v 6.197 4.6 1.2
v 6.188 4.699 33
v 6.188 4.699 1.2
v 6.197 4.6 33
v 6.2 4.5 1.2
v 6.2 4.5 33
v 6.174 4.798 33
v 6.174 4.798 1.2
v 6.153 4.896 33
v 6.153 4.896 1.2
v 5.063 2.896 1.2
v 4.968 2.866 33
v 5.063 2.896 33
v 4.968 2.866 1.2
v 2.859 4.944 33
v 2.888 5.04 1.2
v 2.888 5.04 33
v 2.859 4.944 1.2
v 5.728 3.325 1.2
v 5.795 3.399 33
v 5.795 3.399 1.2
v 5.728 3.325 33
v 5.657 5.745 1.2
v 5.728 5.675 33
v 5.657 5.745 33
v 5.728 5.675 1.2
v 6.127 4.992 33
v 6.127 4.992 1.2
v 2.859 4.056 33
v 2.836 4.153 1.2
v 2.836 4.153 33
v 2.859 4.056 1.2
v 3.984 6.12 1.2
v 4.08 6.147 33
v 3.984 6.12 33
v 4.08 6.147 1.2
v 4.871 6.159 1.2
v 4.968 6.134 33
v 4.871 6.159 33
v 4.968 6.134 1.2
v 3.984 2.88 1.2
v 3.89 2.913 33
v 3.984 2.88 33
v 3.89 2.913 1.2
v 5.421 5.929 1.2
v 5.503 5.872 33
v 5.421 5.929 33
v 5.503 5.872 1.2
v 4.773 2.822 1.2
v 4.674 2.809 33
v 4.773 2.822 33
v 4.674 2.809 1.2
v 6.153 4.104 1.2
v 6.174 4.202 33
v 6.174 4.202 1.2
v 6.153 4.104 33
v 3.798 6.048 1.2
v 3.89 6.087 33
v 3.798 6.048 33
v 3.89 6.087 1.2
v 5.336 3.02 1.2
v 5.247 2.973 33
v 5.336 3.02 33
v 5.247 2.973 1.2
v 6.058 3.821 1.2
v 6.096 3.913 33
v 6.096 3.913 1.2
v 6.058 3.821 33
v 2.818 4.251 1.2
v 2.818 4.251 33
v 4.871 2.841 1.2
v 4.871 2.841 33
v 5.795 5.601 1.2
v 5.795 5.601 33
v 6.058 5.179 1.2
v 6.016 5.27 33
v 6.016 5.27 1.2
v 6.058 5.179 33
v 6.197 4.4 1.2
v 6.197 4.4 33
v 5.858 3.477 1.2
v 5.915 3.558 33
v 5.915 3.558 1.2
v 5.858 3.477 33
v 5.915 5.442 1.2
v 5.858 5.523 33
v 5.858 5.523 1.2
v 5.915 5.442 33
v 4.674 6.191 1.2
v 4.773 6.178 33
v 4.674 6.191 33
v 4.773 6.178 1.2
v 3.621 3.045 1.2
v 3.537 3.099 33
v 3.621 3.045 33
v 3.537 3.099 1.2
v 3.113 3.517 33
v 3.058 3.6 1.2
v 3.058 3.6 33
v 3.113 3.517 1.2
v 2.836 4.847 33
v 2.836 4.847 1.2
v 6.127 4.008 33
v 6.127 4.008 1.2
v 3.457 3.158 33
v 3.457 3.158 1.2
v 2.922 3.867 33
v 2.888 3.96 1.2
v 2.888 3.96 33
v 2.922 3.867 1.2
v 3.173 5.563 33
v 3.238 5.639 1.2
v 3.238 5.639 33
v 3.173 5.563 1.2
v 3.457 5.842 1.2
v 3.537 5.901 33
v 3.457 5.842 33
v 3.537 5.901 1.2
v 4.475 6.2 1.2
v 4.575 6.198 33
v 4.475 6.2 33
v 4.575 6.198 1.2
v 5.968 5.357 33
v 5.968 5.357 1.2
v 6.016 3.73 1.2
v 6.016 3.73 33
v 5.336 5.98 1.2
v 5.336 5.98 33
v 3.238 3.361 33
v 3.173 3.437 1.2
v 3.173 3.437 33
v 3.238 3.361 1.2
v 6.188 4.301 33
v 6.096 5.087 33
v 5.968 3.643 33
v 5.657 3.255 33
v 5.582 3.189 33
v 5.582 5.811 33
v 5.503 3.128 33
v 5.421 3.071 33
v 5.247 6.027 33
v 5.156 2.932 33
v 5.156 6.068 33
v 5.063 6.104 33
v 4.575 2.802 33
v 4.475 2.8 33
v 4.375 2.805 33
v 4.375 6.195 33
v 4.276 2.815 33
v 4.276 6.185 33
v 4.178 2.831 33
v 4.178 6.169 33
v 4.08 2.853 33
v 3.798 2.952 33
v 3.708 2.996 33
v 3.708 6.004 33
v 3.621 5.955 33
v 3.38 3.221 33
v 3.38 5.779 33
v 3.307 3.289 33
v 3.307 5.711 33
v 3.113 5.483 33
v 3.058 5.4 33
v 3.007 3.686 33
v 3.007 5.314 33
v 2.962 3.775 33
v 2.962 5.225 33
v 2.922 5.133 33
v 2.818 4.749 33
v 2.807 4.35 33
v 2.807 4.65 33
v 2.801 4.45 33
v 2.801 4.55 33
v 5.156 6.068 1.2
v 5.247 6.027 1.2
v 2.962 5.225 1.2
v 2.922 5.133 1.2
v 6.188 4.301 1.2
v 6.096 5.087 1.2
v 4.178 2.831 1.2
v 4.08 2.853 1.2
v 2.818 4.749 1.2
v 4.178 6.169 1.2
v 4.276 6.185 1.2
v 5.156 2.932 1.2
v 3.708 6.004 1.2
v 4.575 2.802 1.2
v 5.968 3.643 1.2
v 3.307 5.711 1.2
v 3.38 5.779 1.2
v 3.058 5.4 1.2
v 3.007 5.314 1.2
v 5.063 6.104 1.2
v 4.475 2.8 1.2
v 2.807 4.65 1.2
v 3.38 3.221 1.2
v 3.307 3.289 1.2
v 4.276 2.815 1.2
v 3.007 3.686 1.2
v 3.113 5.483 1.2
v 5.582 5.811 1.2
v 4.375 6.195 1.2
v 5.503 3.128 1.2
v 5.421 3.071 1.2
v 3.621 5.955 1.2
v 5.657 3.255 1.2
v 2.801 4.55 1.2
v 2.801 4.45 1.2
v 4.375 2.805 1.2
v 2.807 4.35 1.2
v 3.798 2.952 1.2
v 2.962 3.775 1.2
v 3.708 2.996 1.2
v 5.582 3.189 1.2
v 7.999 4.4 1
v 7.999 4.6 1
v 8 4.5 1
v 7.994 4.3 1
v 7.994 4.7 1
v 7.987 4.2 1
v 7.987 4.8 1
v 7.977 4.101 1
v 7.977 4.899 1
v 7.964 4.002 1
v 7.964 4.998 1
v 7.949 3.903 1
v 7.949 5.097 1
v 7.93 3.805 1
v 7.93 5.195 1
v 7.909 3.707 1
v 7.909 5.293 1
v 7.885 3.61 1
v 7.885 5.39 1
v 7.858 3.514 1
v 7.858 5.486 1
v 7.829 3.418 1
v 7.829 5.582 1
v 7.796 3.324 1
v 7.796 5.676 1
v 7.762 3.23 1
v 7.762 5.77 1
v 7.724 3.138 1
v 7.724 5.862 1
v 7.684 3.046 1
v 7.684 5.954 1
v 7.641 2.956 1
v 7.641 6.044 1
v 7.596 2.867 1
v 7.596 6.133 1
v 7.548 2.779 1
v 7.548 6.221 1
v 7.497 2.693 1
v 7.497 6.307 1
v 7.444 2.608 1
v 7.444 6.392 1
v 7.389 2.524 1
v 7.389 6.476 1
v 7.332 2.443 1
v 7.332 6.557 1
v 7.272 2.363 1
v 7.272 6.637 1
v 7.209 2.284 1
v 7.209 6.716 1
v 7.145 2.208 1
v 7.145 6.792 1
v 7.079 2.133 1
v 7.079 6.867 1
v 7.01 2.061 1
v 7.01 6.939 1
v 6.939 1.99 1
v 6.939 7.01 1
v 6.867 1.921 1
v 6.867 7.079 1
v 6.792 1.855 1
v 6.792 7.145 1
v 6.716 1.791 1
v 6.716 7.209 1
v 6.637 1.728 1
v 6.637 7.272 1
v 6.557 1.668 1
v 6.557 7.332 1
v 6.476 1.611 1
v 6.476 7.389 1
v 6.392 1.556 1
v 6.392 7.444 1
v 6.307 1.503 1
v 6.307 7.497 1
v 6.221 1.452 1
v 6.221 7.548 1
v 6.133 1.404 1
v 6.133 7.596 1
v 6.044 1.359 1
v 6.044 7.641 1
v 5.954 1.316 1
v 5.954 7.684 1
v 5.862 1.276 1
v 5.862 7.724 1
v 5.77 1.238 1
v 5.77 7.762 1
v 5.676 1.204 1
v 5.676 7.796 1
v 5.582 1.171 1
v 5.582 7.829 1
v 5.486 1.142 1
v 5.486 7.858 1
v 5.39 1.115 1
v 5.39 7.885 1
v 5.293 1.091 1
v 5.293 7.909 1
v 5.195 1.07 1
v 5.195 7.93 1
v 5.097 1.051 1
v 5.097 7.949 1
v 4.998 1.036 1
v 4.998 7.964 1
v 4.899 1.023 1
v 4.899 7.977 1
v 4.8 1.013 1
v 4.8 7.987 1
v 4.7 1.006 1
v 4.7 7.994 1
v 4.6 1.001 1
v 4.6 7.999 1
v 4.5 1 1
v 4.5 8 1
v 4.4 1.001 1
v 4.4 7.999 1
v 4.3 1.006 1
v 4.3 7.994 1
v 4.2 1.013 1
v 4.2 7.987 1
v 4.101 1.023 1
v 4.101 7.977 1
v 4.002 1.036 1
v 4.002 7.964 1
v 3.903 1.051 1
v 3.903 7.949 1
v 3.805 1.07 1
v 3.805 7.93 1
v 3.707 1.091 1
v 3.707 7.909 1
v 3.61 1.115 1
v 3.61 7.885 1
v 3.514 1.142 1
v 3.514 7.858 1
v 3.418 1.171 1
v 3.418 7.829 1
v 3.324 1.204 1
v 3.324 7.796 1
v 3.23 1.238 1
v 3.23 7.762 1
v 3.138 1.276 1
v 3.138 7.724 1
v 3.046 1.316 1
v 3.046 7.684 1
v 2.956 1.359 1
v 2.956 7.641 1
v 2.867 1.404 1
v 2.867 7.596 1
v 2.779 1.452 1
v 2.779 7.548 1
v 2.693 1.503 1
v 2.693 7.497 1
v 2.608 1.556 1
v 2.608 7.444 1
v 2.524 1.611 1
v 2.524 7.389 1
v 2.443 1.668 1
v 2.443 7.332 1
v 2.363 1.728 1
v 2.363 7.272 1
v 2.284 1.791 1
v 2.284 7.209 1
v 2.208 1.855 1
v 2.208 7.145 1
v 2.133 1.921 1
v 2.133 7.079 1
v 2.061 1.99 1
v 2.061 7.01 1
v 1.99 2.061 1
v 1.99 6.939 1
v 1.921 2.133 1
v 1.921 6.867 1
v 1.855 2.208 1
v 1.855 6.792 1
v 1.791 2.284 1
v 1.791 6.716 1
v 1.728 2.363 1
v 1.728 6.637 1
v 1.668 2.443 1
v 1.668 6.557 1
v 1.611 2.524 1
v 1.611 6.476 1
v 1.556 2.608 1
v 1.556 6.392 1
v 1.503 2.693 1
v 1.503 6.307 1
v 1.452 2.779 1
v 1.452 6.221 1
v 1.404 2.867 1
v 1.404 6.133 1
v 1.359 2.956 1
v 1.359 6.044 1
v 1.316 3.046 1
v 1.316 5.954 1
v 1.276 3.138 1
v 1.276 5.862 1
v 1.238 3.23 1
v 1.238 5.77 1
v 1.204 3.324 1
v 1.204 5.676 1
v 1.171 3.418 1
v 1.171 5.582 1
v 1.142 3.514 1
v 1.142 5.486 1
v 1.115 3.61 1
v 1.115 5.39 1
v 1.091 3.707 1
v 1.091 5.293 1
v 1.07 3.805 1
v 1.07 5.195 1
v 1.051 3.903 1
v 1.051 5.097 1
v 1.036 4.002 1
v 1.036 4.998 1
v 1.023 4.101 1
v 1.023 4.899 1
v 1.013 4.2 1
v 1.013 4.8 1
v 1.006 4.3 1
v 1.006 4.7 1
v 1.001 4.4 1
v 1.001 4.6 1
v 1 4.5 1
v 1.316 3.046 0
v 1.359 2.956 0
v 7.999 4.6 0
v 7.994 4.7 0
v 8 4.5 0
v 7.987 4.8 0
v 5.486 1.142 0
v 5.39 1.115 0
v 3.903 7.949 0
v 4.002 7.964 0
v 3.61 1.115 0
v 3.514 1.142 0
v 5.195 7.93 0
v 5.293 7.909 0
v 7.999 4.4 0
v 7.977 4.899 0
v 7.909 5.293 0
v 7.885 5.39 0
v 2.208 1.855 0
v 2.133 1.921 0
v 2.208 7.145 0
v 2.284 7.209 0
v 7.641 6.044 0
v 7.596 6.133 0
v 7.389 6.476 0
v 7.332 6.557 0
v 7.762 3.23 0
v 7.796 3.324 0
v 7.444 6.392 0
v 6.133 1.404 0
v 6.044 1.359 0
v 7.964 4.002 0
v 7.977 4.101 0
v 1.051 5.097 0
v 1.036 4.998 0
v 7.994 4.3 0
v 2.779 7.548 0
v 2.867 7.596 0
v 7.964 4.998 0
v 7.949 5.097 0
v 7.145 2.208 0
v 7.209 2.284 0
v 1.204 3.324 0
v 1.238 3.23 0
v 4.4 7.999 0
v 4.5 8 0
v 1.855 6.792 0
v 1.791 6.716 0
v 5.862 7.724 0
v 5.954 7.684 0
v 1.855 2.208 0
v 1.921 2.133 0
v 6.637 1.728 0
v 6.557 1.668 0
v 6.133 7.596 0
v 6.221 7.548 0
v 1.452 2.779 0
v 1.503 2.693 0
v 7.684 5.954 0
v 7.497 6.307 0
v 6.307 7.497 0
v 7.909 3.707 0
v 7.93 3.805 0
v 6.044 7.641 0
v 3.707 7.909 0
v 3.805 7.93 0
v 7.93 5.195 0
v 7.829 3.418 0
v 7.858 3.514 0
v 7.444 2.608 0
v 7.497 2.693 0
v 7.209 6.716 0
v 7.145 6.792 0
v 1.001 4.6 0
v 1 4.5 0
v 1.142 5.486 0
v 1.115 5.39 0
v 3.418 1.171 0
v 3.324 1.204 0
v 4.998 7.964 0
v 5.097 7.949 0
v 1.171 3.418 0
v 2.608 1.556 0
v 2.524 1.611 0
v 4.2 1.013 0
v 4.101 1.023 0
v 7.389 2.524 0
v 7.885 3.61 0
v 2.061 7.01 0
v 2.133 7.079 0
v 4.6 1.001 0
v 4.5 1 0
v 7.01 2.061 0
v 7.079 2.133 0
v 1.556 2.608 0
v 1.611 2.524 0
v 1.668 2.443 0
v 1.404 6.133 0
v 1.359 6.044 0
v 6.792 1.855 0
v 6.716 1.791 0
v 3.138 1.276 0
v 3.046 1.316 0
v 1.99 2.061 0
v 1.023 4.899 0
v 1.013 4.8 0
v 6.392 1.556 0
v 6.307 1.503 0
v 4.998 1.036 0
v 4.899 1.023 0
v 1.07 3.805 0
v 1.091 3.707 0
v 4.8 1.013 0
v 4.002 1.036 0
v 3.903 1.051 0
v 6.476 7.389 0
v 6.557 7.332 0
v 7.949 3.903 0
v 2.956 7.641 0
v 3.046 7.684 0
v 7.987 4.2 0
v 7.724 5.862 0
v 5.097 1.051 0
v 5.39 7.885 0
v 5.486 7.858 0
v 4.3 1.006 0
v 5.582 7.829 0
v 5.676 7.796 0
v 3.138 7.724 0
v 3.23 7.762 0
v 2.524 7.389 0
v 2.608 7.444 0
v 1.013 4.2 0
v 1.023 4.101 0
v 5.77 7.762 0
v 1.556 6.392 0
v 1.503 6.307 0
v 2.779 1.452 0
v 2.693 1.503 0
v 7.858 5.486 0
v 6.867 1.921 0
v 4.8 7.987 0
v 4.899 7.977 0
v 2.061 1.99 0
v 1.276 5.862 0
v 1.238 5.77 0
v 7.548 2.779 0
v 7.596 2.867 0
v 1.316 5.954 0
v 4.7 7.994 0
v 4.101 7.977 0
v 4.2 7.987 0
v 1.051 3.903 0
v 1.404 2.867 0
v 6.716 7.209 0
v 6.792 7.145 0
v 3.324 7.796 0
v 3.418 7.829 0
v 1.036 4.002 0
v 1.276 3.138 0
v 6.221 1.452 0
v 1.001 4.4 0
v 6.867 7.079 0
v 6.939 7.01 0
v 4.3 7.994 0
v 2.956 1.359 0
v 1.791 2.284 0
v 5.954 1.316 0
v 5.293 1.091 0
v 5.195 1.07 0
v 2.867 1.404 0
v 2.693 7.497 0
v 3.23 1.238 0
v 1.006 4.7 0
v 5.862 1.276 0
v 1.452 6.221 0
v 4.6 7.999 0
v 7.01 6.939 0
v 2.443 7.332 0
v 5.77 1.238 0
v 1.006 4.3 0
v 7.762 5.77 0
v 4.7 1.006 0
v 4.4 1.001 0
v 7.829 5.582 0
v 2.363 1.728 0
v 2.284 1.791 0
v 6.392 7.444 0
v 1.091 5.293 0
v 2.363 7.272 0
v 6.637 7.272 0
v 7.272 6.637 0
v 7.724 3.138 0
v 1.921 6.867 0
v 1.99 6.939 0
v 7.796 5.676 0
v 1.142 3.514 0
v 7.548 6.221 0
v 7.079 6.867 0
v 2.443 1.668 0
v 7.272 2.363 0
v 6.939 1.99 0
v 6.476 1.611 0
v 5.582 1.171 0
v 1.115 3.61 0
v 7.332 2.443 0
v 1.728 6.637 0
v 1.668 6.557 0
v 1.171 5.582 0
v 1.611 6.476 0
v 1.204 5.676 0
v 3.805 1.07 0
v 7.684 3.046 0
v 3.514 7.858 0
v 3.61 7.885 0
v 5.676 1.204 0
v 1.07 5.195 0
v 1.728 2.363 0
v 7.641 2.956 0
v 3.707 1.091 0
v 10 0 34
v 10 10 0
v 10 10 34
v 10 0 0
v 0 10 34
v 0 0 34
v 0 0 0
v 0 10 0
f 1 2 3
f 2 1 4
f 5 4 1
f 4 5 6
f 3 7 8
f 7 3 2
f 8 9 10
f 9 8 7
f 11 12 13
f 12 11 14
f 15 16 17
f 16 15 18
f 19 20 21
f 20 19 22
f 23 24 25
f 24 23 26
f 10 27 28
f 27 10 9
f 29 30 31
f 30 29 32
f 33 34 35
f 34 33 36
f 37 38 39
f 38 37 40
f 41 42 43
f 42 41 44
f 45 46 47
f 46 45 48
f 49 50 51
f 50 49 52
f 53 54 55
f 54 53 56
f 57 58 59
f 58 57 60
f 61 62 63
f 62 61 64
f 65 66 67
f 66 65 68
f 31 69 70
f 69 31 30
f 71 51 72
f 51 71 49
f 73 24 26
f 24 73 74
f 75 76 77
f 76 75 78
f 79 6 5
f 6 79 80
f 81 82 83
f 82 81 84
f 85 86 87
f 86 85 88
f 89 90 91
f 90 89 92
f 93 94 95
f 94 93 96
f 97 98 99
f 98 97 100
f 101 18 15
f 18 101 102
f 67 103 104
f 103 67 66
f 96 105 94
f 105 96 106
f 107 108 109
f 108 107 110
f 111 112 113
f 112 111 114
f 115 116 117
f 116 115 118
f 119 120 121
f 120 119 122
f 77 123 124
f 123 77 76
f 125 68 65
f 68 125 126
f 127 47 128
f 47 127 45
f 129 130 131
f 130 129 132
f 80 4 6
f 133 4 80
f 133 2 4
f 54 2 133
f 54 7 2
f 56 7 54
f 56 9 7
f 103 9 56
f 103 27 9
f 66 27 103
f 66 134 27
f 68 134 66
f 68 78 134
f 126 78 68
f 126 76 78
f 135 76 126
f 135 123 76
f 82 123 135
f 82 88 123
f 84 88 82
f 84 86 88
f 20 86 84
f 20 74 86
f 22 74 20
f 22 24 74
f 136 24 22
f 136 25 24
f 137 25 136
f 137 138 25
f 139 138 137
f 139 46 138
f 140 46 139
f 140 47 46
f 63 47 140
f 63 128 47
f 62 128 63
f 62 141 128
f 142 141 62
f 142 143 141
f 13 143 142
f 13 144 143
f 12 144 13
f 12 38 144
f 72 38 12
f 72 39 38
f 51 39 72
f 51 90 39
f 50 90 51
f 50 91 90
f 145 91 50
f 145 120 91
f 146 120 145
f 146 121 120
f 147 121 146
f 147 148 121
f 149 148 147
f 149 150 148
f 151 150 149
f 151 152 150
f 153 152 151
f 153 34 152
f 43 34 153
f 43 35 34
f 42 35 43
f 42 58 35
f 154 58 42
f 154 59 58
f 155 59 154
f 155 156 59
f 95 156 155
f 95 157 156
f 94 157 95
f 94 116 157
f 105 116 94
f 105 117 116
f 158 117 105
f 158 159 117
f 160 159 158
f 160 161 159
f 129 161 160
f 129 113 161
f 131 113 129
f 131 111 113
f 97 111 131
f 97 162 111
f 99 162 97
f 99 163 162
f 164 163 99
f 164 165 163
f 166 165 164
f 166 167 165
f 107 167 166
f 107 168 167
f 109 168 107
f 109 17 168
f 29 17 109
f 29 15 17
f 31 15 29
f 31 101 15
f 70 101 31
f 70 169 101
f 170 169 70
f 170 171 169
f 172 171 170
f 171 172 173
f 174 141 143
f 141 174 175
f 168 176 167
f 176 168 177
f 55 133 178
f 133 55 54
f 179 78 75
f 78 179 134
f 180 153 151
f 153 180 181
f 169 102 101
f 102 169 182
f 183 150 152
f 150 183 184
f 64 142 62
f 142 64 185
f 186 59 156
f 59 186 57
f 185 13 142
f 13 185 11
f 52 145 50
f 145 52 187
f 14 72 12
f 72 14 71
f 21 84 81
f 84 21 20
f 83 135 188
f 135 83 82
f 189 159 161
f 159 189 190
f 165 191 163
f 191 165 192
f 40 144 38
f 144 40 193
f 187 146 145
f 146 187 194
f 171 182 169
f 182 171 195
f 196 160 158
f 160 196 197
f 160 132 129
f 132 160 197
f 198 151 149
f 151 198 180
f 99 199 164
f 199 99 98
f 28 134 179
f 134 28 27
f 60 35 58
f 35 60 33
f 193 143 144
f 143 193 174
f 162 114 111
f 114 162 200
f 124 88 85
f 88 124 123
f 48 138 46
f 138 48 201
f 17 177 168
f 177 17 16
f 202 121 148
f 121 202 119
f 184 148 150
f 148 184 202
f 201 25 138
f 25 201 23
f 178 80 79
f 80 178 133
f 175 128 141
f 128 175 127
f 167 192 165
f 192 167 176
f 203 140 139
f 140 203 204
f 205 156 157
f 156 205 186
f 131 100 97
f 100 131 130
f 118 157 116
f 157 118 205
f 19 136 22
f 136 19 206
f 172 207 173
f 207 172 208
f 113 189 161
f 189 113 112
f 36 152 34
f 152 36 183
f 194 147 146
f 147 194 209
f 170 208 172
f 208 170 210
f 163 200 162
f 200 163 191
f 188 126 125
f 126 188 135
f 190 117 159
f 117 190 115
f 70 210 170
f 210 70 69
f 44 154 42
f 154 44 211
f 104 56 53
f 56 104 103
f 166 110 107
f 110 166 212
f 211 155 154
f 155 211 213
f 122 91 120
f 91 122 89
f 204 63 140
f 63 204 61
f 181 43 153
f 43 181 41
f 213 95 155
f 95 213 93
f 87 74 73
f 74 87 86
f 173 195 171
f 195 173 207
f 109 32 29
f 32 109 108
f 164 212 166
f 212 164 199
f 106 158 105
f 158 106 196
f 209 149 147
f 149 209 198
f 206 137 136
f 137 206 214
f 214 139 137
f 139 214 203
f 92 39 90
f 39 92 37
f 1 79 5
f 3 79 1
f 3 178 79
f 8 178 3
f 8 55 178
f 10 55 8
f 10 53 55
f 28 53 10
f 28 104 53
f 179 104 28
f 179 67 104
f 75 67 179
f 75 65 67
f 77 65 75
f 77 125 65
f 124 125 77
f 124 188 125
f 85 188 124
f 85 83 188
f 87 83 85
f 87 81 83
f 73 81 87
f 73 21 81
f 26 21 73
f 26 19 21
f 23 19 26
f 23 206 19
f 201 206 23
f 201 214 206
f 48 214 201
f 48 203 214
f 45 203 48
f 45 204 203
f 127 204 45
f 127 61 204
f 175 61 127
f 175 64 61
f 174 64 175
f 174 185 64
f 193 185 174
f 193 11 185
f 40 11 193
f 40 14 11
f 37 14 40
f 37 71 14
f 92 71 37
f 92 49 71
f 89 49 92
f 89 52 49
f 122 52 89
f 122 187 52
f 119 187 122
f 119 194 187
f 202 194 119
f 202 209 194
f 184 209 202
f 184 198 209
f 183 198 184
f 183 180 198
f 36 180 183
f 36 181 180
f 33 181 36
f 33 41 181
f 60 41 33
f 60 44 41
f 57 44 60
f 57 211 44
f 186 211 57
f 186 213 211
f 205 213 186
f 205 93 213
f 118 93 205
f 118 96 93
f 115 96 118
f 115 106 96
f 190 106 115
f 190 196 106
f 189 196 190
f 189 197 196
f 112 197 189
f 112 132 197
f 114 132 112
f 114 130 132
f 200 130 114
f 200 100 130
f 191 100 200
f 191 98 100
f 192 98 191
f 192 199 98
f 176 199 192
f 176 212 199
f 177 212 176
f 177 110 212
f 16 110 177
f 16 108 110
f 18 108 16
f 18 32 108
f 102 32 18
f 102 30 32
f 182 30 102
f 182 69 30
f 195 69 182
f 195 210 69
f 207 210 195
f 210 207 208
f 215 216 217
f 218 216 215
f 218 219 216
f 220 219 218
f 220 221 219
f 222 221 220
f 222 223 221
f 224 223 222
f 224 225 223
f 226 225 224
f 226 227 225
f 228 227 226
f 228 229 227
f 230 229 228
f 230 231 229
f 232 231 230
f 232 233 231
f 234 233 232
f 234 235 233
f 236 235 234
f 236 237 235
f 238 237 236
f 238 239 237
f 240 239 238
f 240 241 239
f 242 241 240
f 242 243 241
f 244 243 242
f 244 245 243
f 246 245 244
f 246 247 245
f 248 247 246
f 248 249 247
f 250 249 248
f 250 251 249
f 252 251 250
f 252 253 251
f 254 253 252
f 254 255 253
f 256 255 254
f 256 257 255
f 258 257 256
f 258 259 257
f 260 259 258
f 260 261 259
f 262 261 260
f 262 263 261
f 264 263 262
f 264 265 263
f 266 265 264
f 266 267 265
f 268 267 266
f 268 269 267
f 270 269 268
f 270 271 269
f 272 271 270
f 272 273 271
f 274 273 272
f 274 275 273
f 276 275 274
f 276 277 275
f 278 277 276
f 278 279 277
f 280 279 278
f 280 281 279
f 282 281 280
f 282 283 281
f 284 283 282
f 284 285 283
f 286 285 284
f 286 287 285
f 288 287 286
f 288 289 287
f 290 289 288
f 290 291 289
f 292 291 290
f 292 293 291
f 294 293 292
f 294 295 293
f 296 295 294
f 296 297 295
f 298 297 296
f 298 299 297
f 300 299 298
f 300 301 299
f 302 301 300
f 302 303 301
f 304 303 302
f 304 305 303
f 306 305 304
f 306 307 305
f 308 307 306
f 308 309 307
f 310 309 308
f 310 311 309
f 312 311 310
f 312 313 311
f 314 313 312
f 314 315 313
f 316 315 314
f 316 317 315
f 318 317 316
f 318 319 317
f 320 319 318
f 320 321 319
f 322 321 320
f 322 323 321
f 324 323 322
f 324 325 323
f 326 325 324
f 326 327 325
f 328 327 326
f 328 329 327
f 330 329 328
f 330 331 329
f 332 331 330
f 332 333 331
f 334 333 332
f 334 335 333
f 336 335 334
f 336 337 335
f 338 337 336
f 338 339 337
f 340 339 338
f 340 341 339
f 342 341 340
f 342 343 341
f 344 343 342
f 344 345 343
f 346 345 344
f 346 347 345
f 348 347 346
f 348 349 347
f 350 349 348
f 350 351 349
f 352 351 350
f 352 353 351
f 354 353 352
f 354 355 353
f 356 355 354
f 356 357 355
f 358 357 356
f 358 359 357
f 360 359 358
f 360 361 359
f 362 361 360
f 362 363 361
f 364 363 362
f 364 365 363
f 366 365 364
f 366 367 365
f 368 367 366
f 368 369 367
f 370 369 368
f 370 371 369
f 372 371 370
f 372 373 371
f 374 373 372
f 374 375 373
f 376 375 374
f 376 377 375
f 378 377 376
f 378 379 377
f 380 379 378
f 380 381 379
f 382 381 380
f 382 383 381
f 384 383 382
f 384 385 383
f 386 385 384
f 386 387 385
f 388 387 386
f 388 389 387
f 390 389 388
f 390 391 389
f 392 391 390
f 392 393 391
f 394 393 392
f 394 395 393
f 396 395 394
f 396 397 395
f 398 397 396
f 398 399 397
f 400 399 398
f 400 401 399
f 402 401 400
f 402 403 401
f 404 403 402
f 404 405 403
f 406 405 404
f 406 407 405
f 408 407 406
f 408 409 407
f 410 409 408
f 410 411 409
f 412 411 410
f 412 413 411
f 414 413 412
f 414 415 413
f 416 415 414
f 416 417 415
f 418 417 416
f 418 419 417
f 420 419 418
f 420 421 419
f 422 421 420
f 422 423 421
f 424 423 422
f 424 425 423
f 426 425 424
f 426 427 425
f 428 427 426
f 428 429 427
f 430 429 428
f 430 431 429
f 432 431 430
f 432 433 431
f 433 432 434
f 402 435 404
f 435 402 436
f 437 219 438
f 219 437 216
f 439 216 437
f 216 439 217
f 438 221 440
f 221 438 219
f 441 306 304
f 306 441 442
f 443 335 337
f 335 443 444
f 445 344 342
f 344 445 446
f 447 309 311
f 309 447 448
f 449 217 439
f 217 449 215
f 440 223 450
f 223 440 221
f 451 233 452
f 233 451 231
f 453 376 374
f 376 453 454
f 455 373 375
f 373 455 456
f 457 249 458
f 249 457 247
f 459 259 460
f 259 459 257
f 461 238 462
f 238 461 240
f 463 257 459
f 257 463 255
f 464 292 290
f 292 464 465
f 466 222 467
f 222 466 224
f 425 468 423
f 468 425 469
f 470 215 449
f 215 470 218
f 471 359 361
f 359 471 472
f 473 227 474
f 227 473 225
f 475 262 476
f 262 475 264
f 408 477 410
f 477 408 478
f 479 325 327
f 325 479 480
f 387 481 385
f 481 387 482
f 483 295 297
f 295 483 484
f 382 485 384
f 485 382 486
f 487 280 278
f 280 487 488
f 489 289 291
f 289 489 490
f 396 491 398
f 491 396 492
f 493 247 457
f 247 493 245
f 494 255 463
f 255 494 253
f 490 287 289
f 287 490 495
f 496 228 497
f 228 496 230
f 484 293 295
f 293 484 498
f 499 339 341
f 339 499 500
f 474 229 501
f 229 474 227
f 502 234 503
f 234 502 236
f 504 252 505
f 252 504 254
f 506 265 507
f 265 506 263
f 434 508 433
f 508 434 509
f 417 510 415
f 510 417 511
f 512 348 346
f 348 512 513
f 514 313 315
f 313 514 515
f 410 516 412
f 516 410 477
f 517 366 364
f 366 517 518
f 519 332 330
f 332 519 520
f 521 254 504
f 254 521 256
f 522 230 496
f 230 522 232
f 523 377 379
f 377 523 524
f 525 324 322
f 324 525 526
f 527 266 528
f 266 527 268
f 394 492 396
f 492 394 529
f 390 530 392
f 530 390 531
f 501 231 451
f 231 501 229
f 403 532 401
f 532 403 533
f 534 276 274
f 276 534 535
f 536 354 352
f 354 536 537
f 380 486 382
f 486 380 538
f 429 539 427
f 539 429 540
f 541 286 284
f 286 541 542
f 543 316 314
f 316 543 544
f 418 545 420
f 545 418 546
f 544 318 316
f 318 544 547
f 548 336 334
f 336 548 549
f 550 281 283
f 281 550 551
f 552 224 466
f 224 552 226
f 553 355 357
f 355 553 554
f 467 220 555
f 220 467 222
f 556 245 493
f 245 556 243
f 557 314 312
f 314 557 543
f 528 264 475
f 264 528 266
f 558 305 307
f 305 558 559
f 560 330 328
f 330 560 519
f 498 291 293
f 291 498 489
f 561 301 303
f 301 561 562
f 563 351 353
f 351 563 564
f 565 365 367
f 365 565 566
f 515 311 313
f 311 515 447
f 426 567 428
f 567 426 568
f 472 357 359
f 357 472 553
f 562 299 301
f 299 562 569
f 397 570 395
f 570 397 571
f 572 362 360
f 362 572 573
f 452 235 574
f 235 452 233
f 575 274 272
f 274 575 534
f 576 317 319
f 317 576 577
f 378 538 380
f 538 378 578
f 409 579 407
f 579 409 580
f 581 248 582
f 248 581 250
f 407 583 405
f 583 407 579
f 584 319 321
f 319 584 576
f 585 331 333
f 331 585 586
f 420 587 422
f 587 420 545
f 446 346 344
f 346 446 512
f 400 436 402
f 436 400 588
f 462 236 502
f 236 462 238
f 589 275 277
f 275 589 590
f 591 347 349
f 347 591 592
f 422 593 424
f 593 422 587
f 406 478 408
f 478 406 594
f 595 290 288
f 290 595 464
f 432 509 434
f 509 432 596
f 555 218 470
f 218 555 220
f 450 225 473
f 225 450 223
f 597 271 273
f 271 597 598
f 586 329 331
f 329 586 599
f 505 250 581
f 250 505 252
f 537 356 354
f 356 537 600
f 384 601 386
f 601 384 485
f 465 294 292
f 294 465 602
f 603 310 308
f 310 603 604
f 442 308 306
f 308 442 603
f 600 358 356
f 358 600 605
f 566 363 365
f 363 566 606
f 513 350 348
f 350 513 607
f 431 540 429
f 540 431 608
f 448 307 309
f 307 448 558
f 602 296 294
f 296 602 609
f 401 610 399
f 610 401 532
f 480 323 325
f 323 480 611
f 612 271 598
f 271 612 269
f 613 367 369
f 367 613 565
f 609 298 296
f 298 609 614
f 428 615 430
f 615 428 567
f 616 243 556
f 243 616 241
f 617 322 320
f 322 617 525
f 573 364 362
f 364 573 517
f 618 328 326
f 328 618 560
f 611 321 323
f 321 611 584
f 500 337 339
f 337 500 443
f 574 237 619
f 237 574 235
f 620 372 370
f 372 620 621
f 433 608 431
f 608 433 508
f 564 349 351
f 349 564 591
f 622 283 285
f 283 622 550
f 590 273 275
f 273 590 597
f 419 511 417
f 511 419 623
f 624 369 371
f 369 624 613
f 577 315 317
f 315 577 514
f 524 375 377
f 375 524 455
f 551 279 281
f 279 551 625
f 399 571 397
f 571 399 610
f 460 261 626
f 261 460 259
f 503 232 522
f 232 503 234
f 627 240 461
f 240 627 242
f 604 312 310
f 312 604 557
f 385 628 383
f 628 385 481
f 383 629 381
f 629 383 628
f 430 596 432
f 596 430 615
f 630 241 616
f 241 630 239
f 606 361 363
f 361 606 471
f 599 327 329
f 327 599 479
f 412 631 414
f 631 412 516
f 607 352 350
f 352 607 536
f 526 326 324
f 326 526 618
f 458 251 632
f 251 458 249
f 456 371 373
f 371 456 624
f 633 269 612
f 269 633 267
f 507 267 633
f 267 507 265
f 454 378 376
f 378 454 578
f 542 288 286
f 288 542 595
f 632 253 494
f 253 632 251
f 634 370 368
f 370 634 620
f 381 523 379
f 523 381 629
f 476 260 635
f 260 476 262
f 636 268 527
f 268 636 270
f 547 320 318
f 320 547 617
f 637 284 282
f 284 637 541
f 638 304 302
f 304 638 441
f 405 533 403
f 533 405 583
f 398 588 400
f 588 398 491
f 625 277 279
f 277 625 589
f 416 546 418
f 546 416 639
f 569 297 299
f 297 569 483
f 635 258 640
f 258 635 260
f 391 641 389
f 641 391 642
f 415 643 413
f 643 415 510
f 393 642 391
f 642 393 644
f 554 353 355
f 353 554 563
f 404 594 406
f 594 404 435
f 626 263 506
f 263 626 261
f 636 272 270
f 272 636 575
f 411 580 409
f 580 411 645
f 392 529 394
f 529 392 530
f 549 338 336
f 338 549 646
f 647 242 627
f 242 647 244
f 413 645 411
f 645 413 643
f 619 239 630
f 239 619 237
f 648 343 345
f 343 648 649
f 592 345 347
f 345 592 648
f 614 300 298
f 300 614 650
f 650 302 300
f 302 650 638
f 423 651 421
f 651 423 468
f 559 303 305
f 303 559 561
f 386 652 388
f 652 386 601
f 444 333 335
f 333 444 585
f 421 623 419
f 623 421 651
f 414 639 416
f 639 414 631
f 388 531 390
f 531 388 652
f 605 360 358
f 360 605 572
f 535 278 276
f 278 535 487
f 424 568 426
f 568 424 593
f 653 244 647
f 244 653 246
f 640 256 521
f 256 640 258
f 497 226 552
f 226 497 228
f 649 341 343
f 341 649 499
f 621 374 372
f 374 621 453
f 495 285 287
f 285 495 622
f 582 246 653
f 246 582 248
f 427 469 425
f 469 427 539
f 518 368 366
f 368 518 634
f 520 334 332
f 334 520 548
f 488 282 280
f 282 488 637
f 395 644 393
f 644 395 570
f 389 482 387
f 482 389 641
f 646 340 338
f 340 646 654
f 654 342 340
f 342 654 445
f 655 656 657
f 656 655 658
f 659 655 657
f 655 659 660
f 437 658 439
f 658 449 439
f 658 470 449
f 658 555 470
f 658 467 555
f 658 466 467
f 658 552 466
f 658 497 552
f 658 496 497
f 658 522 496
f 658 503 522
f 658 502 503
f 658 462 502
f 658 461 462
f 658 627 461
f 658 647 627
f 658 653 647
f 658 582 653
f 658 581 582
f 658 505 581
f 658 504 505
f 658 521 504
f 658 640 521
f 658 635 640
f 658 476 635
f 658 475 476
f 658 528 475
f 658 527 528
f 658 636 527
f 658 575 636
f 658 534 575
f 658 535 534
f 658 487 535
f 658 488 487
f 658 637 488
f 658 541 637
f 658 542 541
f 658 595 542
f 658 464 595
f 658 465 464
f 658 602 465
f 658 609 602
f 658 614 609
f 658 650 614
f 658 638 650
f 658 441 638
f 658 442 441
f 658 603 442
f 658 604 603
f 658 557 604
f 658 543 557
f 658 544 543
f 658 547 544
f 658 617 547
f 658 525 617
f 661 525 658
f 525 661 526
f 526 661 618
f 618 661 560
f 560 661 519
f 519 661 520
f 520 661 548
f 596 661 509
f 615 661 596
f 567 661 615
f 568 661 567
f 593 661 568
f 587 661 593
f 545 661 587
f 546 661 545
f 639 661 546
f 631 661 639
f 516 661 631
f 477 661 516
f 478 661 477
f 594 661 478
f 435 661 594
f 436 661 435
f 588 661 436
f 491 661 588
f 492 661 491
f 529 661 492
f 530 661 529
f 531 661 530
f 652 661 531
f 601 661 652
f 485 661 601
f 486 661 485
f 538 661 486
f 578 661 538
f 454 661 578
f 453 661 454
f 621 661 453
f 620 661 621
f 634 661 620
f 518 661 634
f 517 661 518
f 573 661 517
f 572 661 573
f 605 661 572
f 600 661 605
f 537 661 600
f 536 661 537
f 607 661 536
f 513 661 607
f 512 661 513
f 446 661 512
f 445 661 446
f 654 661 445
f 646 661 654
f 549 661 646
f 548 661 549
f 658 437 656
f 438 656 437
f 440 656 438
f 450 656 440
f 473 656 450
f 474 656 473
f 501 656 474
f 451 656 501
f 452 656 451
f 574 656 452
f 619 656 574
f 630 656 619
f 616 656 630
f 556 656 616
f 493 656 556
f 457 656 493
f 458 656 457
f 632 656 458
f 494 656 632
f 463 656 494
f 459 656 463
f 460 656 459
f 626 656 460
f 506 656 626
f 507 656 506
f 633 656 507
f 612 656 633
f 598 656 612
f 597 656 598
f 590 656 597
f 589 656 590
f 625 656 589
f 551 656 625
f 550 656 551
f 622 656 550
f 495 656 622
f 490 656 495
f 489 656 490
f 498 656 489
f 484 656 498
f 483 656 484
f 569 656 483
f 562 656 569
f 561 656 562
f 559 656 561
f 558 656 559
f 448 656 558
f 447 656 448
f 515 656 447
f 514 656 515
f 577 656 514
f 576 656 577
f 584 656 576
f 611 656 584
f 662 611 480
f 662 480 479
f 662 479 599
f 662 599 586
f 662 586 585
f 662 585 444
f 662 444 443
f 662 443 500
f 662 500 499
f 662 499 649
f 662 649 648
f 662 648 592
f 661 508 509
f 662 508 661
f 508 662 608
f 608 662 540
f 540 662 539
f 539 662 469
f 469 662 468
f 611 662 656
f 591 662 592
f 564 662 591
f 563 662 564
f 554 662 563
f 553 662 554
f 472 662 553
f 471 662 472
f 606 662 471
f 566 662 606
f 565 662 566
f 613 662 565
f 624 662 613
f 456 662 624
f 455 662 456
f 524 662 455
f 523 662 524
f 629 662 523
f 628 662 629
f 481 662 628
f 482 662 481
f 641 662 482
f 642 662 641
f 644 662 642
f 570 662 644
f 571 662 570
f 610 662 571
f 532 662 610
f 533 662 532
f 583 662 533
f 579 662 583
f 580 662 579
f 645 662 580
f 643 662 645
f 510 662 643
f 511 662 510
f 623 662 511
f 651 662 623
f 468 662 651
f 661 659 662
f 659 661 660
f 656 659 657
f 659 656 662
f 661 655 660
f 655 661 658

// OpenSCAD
// file: customizer.scad
// Customizer.scad is where parameters are shared across models. This file is placed into the public domain. Modify to your need.

width = 100;
height = 79;
length = 2;
border = 2;

m = 0.3;
frame_border = 4;

nailhead_diameter = 7;
nail_shaft_width = 3.2;
nail_height = 33;

include_nail = false;
add_hook = false;
// file: vendors/UtilitySCAD-R1/utility.scad
/*This library, part of UtilitySCAD, is placed into the public domain by NMR_Scientist.

Version: R1
Title: UtilitySCAD
Description: Miscellaneous utility modules I developed over the course of several projects to reuse common operations that were seen over various models.

History:
* ??/??/2024 - R1 - First release to be with a model whenever it is released.
*/

$fa = 1;
$fs = 0.1;

use <MCAD/regular_shapes.scad>;

//Move objects in the x-axis.
module move_x (x)
{
    translate([x,0,0])
    {
        children();
    }
}

//Move objects in the y-axis
module move_y (y)
{
    translate([0,y,0])
    {
        children();
    }
}

//Move objects in the z-ax
module move_z (z)
{
    translate([0,0,z])
    {
        children();
    }
}

//Move objects by a given point in all direction. -1 would means moving to the left, moving back, and moving down by one point.
module move_by(point)
{
    translate([point,point,point])
    {
        children();
    }
}

//Exactly like move_by, but a negation. Named for its very common use in adding tolerance to objects.
module move_by_margin(m)
{
    move_by(-m)
    {
        children();
    }
}

//A cylinder rotated to its side.
module hor_cylinder(width,r,r)
{
    move_y(r)
        move_z(r)
            rotate([0,90,0])
            {
                cylinder(width,r,r);
            }
}

module hor_cylinder_y(length,r)
{
    translate([r * 2,0,0])
    {
        rotate([0,0,90])
        {
            hor_cylinder(length,r);
        }
    }
}


//Cut a object at a given height and then move that object down, usually to zero if the object was placed at zero height.
module hor_cut(width,length,height)
{
    translate([0,0,-height])
    {
        difference()
        {
            children();
            translate([-1,-1,-1])
            {
                cube([width + 2,length + 2,height + 1]);
            }
        }
    }
}

function bevel_radius(length) = length * 2 / 3;
function bevel_height(r) = r * sqrt(3)/2;

//Bevel at 45 degree slope up, facing back, then extrude upward by height.
module bevel_up_back_45(width,length,height)
{
    r = bevel_radius(length);
    z = bevel_height(r);
    m = 0.1;
    m_2 = m * 2;
    difference()
    {
        translate([0,r / 2,z])
        {
            rotate([0,90,0])
            {
                triangle_prism(width,r);
            }
        }
        // Cut off to the required height.
        move_x(-m)
            move_y(-m)
                move_z(height)
                   cube([width + m,length + m,z * 2 - height]);
    }
    //If cutting off isn't happening simply add height.
    if (height >= z)
    {
        move_z(z)
        {
            cube([width,length,height - z]);
        }
    }
}

module bevel_up_front_45(width,length,height)
{
    r = bevel_radius(length);
    z = bevel_height(r);
    m = 0.1;
    m_2 = m * 2;
    difference()
    {
        translate([width,r,z])
        {
            rotate([0,90,180])
            {
                triangle_prism(width,r);
            }
        }
        // Cut off to the required height.
        move_x(-m)
            move_y(-m)
                move_z(height)
                   cube([width + m,length + m,z * 2 - height]);
    }
    //If cutting off isn't happening simply add height.
    if (height >= z)
    {
        move_z(z)
        {
            cube([width,length,height - z]);
        }
    }
}

//Center an object against a particular width of another object.
module center(centering_w,target_w)
{
    x = (target_w - centering_w) / 2;
    translate([x,0,0])
    {
        children();
    }
}

//Move object to a certain value of x, but also account for the object size, such that the object is place before the point x. For a postive value of x, that is before the x, for a negative value of x, that is next to x. Useful for dimensional accurate placement.
module move_object_x(x,r)
{
    diameter = r * 2;
    if (abs(x) < diameter)
    {
        echo("Cannot move!");
    }
    else
    {
        if (x > 0)
        {
            move_x(x - diameter)
            {
                children();
            }
        }
        else if (x < 0)
        {
            move_x(x + diameter)
                children();
        }
    }
}


//Move object to a certain value of z, but also account for the object size, such that the object is place before the point z. For a postive value of z, that is below of z, for a negative value of z, that is above z. Useful for dimensional accurate placement.
module move_object_z(z, r)
{
    diameter = r * 2;
    if (abs(z) < diameter)
    {
        echo("Cannot move!");
    }
    else
    {
        if (z > 0)
        {
            move_z(z - diameter)
            {
                children();
            }
        }
        else if (z < 0)
        {
            move_z(z + diameter)
                children();
        }
    }
}


//Generaate all notches in a castellation at the same time, and space each notch for the length of the notch.
module notches(n, multipler)
{
    for (x = [1:n])
    {
        final_x = (x - 1) * multipler;
        move_x(final_x)
        {
            if ((x - 1) % 2 == 0)
            {
               children();
            }
        }
    }
}

//Get the total width of the Castellation, starting with the first and last notches.
function CastellateTotalW(w,size) = (w - 1) % 2 == 1 ? (w - 1) * size.x : w * size.x;


//Center the resulting castellation of a certain cuboid size.
module castellate(width,size, m = 0)
{
    total_notches = floor(width / size.x);
    total_w = CastellateTotalW(total_notches,size);
    center(total_w,width)
    {
        notches(total_notches,size.x)
        {
            move_x(m)
            {
                shrink = [size.x - (m * 2),size.y,size.z];
                cube(shrink);
            }
        }
    }

}
// main file
use <vendors/UtilitySCAD-R1/utility.scad>;
include <customizer.scad>;

$fa = 1;
$fs = 0.1;


nailhead_r = nailhead_diameter / 2;
nail_shaft_r = nail_shaft_width / 2 + 0.1;
border = 2;
box_width = 10;
box_length = 10;

module container_box(m = 0)
{
    m_2 = m * 2;
    total_l = box_length + m_2;
    echo("total thickness");
    echo(total_l);
    translate([-m,-m,0])
    {
        cube([box_width + m_2,total_l,nail_height + 1]);
    }
}

module nail_mold()
{
    translate([nailhead_r, nailhead_r, 0])
    {
        difference()
        {
            move_z(-1)
            {
                cylinder(nail_height + 1,nail_shaft_r,nail_shaft_r);

            }
            move_z(1)
            {
                cylinder(0.2,nail_shaft_r,nail_shaft_r);
            }
        }

        move_z(-1)
        {
            cylinder(2,nailhead_r,nailhead_r);
        }
    }
}

difference()
{
    container_box();
    translate([1,1,0])
    {
        nail_mold();

    }
}
